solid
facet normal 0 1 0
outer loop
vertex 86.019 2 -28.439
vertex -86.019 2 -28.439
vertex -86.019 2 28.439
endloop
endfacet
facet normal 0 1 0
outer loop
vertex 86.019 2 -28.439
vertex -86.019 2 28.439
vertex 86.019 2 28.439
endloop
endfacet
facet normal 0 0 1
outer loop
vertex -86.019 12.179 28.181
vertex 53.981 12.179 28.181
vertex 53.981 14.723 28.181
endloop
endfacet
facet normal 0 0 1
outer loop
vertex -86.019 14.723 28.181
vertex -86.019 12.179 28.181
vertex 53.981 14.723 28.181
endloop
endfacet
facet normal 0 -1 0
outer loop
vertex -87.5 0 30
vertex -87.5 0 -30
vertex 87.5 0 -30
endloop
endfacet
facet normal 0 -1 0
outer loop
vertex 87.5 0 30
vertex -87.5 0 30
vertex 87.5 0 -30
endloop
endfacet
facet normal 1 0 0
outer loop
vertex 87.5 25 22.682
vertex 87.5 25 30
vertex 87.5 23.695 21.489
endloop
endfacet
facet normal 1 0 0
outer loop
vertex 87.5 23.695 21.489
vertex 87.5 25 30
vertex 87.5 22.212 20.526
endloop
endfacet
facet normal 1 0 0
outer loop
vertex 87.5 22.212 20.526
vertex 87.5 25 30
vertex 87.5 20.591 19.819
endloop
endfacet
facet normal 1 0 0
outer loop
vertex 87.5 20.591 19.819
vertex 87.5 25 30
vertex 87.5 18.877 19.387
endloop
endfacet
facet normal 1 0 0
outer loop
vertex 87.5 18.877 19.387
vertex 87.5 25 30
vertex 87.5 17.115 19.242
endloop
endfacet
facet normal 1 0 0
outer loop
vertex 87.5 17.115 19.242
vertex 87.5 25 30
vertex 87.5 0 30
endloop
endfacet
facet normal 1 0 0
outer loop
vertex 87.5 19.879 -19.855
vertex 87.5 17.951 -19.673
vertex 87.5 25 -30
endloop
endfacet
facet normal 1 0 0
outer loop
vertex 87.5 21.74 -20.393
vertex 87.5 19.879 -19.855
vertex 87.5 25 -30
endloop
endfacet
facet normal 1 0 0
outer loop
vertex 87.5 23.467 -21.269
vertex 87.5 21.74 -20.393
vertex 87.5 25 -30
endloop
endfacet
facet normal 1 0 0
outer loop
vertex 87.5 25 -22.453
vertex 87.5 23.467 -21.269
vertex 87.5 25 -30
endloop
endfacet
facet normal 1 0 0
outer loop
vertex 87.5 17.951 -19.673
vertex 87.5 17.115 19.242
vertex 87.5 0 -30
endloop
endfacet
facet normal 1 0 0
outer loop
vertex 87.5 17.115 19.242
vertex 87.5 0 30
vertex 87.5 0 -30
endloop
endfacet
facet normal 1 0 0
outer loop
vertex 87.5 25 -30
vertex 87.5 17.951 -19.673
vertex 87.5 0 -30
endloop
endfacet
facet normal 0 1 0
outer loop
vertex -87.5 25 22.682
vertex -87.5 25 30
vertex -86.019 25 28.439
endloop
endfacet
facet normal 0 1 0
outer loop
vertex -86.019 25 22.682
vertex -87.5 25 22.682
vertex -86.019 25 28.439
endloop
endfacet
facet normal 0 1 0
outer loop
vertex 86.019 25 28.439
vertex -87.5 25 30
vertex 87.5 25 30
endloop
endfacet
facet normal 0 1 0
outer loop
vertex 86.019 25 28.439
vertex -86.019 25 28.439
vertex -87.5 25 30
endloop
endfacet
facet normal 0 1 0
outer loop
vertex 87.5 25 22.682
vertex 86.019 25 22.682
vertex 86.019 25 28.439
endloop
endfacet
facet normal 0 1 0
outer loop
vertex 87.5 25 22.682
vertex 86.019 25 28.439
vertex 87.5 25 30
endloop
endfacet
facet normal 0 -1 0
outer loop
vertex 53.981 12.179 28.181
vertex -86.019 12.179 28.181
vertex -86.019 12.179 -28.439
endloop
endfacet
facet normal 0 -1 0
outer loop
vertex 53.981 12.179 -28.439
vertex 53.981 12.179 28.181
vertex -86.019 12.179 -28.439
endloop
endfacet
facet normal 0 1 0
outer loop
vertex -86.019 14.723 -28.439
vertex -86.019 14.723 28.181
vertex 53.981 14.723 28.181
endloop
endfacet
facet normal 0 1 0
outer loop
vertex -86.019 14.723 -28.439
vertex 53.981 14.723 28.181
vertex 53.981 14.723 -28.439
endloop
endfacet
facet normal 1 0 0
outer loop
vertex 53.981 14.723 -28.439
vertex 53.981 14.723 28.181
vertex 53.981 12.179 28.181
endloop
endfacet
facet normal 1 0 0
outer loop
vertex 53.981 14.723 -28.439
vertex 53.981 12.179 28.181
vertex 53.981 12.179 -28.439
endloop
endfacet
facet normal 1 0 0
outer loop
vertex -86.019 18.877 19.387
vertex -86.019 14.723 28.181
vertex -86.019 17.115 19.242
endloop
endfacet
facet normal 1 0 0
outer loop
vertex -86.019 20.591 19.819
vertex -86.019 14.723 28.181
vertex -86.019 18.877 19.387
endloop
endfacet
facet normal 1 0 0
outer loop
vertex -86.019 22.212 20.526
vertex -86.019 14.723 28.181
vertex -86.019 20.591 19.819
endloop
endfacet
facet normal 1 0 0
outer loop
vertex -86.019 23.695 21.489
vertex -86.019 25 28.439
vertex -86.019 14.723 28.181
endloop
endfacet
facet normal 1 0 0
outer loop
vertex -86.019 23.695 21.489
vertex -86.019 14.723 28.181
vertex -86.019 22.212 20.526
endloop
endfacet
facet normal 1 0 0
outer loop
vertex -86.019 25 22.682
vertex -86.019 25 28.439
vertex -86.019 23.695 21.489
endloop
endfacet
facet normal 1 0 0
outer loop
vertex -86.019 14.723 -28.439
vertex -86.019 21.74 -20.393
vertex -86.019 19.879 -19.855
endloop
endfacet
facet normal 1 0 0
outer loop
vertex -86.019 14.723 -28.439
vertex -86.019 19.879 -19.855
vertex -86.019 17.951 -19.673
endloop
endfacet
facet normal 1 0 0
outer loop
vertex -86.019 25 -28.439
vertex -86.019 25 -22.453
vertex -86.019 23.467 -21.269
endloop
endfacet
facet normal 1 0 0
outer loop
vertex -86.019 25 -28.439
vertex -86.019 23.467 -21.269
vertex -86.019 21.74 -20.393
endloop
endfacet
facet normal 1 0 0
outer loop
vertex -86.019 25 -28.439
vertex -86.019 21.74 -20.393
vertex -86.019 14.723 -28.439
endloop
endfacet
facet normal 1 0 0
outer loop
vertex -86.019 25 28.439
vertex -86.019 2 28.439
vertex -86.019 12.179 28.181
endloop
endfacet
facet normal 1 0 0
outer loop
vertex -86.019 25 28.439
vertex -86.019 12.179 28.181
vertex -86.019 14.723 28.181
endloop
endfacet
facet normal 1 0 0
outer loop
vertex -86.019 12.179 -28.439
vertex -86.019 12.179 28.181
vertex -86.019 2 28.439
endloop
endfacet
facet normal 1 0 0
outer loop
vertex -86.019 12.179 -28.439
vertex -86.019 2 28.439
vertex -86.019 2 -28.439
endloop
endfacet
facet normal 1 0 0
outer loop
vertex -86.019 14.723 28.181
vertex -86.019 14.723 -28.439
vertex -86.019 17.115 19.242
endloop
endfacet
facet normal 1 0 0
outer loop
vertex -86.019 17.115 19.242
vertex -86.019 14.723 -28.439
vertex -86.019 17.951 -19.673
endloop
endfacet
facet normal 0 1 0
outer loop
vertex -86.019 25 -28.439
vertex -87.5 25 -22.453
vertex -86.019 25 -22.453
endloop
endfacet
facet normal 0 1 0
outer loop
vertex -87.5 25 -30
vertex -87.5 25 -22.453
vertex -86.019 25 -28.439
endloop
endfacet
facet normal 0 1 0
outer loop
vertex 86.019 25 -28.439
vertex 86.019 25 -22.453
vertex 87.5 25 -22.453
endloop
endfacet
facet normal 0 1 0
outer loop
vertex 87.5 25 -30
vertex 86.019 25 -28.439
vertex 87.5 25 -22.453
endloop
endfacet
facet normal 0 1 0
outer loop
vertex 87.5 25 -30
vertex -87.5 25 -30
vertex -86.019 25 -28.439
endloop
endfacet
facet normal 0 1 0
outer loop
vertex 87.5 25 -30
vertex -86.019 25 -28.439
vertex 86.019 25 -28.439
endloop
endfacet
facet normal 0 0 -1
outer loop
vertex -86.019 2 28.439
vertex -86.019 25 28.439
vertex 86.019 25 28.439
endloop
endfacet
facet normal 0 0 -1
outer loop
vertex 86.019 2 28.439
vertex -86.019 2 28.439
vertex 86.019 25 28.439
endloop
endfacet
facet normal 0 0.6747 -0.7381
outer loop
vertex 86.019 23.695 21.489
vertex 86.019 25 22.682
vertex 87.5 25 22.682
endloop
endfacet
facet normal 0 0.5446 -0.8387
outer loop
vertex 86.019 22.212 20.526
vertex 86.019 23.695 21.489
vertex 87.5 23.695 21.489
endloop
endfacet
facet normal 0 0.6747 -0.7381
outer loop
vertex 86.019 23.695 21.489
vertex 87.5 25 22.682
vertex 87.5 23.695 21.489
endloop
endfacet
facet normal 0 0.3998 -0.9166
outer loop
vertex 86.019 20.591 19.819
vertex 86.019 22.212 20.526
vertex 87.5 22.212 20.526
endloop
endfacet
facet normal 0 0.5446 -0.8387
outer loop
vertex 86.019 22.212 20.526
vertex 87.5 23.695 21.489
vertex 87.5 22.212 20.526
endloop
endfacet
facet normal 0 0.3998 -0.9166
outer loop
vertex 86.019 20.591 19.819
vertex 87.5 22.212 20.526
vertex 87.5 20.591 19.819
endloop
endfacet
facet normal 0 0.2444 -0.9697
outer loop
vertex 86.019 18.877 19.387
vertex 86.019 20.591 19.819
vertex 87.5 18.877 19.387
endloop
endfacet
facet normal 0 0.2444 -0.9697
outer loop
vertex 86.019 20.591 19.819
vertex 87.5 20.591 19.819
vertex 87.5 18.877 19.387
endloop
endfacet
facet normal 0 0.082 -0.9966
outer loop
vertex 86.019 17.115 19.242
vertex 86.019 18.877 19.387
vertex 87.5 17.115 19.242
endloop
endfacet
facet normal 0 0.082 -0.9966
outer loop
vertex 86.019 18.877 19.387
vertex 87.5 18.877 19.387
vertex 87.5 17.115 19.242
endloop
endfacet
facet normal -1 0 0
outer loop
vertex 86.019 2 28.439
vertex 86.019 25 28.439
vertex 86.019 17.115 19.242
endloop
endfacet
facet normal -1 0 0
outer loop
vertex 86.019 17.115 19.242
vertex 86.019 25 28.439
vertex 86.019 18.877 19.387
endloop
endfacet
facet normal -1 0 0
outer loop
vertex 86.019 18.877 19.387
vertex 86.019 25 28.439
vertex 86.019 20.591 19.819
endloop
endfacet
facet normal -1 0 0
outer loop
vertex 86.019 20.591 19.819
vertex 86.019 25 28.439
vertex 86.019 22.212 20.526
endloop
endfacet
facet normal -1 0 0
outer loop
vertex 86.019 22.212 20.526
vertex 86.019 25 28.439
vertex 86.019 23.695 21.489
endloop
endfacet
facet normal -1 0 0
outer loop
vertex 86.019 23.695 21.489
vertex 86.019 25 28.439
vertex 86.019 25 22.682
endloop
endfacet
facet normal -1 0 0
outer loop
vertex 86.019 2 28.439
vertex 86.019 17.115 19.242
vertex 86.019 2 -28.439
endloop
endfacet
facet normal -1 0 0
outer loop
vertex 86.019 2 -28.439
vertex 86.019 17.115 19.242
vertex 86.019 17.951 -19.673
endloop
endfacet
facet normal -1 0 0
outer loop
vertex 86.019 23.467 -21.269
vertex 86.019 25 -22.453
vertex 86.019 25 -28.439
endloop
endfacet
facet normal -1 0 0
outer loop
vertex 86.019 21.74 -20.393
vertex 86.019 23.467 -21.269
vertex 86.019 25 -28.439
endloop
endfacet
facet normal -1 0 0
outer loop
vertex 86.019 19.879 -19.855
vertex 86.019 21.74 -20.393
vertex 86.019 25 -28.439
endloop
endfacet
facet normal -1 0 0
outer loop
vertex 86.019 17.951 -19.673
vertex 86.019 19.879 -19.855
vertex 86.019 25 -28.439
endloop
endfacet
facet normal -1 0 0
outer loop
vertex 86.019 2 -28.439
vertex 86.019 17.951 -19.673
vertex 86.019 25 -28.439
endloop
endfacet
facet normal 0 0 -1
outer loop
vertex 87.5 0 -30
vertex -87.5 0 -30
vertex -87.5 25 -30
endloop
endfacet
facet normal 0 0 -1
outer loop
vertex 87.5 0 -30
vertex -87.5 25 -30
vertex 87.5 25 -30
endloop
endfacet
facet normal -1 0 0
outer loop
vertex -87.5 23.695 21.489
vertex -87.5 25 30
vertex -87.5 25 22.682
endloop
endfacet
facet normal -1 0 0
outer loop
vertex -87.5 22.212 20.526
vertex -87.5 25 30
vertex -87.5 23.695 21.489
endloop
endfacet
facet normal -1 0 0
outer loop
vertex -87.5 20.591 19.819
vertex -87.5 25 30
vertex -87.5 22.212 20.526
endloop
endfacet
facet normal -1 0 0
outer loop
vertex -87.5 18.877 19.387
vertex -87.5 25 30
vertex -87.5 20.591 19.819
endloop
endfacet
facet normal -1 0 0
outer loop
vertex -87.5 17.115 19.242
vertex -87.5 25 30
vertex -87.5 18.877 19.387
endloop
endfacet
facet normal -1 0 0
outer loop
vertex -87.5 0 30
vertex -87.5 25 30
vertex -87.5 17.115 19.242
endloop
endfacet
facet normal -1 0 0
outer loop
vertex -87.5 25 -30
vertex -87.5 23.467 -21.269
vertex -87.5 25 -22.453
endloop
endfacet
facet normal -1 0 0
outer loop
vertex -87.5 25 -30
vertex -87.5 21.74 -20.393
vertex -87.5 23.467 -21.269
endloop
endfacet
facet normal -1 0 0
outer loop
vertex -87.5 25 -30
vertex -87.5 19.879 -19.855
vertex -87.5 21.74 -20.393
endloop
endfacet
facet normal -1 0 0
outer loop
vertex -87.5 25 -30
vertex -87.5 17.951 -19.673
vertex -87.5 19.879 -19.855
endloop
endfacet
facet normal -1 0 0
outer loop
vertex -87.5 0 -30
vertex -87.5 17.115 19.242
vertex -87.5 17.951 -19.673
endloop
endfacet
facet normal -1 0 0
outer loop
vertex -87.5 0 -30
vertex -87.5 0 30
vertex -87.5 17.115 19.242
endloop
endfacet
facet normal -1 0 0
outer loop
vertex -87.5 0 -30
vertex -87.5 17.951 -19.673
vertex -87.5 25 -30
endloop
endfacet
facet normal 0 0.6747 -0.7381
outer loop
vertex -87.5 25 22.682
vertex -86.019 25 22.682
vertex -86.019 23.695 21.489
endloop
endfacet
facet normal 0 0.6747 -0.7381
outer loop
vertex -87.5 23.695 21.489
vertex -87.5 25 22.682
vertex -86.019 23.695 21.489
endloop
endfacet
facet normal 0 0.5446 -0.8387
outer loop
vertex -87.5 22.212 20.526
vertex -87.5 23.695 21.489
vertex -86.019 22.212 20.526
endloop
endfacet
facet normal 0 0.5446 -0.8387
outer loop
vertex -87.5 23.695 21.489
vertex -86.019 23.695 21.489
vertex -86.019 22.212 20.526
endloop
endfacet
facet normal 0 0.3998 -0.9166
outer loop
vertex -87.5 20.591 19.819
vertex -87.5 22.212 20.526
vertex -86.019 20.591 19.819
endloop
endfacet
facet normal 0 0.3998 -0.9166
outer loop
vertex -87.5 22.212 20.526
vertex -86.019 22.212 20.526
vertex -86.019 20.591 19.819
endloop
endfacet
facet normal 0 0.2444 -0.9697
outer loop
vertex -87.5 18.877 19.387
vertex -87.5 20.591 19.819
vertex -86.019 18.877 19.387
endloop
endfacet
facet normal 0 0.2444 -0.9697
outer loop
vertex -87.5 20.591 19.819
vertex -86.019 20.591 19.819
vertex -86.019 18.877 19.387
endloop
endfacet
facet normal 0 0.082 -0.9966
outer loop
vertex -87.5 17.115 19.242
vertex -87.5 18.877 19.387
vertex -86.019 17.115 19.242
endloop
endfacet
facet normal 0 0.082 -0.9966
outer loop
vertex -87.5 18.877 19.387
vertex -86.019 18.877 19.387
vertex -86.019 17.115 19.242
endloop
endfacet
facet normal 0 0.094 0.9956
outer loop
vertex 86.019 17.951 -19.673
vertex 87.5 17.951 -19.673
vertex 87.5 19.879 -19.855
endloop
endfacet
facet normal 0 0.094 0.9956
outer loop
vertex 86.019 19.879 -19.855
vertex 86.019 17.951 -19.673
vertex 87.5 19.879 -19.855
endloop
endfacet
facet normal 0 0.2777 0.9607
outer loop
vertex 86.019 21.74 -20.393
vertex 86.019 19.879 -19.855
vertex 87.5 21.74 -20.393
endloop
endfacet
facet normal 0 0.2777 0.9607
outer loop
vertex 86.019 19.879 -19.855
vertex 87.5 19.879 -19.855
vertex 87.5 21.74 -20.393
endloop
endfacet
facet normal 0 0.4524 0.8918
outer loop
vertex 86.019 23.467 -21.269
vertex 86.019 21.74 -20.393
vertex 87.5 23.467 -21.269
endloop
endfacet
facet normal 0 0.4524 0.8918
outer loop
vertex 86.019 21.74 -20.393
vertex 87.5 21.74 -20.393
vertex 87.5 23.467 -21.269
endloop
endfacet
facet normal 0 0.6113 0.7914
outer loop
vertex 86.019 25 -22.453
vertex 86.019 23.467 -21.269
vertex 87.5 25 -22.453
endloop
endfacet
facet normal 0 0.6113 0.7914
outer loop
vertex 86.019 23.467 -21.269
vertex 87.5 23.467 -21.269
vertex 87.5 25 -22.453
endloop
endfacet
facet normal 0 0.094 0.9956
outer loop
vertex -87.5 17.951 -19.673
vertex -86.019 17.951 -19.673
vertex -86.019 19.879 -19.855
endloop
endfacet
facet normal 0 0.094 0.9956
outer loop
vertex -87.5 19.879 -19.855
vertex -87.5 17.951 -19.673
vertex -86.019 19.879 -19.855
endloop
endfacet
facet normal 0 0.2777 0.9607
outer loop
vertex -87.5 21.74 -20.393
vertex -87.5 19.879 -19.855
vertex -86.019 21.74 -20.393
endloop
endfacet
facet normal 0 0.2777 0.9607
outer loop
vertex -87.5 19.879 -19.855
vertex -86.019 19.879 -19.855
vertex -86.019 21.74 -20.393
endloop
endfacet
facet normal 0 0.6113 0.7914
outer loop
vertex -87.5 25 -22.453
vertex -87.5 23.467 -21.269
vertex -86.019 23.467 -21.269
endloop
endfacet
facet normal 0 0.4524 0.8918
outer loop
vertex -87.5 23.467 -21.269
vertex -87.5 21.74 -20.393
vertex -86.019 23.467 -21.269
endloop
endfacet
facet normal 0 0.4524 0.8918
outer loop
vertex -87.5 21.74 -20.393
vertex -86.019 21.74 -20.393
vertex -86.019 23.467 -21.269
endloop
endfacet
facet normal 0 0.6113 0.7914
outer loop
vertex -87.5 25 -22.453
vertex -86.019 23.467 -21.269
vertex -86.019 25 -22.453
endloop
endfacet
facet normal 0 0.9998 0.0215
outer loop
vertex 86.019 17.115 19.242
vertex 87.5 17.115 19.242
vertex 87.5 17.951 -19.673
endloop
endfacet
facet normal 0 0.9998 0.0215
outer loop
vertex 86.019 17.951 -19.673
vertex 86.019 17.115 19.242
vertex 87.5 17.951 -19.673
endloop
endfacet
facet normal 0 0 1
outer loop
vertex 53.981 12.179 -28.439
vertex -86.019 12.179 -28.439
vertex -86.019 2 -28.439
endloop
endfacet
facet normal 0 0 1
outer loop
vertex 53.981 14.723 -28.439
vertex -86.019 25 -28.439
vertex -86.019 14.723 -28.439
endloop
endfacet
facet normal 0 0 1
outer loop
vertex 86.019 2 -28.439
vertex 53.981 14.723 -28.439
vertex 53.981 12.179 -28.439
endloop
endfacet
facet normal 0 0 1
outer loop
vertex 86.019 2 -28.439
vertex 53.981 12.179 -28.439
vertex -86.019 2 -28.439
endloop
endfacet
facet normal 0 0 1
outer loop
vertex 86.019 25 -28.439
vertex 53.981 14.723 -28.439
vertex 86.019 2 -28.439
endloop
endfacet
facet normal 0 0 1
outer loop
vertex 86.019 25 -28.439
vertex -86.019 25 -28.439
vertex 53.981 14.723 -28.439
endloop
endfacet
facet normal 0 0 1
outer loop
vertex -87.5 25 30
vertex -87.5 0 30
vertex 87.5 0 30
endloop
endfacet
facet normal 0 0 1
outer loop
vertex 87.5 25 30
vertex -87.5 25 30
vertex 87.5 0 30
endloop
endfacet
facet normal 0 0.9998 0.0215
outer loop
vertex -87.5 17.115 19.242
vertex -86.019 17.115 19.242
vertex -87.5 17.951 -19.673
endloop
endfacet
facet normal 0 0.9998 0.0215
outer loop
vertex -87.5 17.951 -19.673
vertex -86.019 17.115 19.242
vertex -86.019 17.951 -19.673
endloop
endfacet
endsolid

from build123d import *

# Parameters (mm, degrees)
SKETCH1_W           = 175
SKETCH1_H           = 60
BOSS_EXTRUDE1_DEPTH = 25
SKETCH2_W           = 172.037419054
SKETCH2_H           = 56.878309912
CUT_EXTRUDE2_DEPTH  = 23
CUT_EXTRUDE4_DEPTH  = 180.30421077
SKETCH5_W           = 56.619672169
SKETCH5_H           = 2.543260903
BOSS_EXTRUDE2_DEPTH = 140


with BuildPart() as part:
    # Sketch1 → Boss-Extrude1 (new body)
    with BuildSketch(Plane(origin=(0, 0, 0), x_dir=(1, 0, 0), z_dir=(0, 1, 0))):
        Rectangle(SKETCH1_W, SKETCH1_H)
    extrude(amount=BOSS_EXTRUDE1_DEPTH)

    # Sketch2 → Cut-Extrude2 (cut)
    with BuildSketch(Plane(origin=(0, 25, 0), x_dir=(1, 0, 0), z_dir=(0, 1, 0))):
        Rectangle(SKETCH2_W, SKETCH2_H)
    extrude(amount=-CUT_EXTRUDE2_DEPTH, mode=Mode.SUBTRACT)

    # Sketch3 → Cut-Extrude4 (cut, through all)
    with BuildSketch(Plane(origin=(87.5, 0, 0), x_dir=(0, 0, -1), z_dir=(1, 0, 0))):
        with BuildLine():
            ThreePointArc((-22.681609782, 25), (-20.139304377, 21.416181436), (-19.241971202, 17.114801954))
            Line((-19.241971202, 17.114801954), (19.672994279, 17.951296347))
            ThreePointArc((19.672994279, 17.951296347), (20.393002527, 21.739785058), (22.452628009, 25))
            Line((22.452628009, 25), (-22.681609782, 25))
        make_face()
    extrude(amount=-CUT_EXTRUDE4_DEPTH, mode=Mode.SUBTRACT)

    # Sketch5 → Boss-Extrude2 (add)
    with BuildSketch(Plane(origin=(-86.018709527, 0, 0), x_dir=(0, 0, -1), z_dir=(1, 0, 0))):
        with Locations((0.129318872, 13.450991009)):
            Rectangle(SKETCH5_W, SKETCH5_H)
    extrude(amount=BOSS_EXTRUDE2_DEPTH)


solid = part.part
